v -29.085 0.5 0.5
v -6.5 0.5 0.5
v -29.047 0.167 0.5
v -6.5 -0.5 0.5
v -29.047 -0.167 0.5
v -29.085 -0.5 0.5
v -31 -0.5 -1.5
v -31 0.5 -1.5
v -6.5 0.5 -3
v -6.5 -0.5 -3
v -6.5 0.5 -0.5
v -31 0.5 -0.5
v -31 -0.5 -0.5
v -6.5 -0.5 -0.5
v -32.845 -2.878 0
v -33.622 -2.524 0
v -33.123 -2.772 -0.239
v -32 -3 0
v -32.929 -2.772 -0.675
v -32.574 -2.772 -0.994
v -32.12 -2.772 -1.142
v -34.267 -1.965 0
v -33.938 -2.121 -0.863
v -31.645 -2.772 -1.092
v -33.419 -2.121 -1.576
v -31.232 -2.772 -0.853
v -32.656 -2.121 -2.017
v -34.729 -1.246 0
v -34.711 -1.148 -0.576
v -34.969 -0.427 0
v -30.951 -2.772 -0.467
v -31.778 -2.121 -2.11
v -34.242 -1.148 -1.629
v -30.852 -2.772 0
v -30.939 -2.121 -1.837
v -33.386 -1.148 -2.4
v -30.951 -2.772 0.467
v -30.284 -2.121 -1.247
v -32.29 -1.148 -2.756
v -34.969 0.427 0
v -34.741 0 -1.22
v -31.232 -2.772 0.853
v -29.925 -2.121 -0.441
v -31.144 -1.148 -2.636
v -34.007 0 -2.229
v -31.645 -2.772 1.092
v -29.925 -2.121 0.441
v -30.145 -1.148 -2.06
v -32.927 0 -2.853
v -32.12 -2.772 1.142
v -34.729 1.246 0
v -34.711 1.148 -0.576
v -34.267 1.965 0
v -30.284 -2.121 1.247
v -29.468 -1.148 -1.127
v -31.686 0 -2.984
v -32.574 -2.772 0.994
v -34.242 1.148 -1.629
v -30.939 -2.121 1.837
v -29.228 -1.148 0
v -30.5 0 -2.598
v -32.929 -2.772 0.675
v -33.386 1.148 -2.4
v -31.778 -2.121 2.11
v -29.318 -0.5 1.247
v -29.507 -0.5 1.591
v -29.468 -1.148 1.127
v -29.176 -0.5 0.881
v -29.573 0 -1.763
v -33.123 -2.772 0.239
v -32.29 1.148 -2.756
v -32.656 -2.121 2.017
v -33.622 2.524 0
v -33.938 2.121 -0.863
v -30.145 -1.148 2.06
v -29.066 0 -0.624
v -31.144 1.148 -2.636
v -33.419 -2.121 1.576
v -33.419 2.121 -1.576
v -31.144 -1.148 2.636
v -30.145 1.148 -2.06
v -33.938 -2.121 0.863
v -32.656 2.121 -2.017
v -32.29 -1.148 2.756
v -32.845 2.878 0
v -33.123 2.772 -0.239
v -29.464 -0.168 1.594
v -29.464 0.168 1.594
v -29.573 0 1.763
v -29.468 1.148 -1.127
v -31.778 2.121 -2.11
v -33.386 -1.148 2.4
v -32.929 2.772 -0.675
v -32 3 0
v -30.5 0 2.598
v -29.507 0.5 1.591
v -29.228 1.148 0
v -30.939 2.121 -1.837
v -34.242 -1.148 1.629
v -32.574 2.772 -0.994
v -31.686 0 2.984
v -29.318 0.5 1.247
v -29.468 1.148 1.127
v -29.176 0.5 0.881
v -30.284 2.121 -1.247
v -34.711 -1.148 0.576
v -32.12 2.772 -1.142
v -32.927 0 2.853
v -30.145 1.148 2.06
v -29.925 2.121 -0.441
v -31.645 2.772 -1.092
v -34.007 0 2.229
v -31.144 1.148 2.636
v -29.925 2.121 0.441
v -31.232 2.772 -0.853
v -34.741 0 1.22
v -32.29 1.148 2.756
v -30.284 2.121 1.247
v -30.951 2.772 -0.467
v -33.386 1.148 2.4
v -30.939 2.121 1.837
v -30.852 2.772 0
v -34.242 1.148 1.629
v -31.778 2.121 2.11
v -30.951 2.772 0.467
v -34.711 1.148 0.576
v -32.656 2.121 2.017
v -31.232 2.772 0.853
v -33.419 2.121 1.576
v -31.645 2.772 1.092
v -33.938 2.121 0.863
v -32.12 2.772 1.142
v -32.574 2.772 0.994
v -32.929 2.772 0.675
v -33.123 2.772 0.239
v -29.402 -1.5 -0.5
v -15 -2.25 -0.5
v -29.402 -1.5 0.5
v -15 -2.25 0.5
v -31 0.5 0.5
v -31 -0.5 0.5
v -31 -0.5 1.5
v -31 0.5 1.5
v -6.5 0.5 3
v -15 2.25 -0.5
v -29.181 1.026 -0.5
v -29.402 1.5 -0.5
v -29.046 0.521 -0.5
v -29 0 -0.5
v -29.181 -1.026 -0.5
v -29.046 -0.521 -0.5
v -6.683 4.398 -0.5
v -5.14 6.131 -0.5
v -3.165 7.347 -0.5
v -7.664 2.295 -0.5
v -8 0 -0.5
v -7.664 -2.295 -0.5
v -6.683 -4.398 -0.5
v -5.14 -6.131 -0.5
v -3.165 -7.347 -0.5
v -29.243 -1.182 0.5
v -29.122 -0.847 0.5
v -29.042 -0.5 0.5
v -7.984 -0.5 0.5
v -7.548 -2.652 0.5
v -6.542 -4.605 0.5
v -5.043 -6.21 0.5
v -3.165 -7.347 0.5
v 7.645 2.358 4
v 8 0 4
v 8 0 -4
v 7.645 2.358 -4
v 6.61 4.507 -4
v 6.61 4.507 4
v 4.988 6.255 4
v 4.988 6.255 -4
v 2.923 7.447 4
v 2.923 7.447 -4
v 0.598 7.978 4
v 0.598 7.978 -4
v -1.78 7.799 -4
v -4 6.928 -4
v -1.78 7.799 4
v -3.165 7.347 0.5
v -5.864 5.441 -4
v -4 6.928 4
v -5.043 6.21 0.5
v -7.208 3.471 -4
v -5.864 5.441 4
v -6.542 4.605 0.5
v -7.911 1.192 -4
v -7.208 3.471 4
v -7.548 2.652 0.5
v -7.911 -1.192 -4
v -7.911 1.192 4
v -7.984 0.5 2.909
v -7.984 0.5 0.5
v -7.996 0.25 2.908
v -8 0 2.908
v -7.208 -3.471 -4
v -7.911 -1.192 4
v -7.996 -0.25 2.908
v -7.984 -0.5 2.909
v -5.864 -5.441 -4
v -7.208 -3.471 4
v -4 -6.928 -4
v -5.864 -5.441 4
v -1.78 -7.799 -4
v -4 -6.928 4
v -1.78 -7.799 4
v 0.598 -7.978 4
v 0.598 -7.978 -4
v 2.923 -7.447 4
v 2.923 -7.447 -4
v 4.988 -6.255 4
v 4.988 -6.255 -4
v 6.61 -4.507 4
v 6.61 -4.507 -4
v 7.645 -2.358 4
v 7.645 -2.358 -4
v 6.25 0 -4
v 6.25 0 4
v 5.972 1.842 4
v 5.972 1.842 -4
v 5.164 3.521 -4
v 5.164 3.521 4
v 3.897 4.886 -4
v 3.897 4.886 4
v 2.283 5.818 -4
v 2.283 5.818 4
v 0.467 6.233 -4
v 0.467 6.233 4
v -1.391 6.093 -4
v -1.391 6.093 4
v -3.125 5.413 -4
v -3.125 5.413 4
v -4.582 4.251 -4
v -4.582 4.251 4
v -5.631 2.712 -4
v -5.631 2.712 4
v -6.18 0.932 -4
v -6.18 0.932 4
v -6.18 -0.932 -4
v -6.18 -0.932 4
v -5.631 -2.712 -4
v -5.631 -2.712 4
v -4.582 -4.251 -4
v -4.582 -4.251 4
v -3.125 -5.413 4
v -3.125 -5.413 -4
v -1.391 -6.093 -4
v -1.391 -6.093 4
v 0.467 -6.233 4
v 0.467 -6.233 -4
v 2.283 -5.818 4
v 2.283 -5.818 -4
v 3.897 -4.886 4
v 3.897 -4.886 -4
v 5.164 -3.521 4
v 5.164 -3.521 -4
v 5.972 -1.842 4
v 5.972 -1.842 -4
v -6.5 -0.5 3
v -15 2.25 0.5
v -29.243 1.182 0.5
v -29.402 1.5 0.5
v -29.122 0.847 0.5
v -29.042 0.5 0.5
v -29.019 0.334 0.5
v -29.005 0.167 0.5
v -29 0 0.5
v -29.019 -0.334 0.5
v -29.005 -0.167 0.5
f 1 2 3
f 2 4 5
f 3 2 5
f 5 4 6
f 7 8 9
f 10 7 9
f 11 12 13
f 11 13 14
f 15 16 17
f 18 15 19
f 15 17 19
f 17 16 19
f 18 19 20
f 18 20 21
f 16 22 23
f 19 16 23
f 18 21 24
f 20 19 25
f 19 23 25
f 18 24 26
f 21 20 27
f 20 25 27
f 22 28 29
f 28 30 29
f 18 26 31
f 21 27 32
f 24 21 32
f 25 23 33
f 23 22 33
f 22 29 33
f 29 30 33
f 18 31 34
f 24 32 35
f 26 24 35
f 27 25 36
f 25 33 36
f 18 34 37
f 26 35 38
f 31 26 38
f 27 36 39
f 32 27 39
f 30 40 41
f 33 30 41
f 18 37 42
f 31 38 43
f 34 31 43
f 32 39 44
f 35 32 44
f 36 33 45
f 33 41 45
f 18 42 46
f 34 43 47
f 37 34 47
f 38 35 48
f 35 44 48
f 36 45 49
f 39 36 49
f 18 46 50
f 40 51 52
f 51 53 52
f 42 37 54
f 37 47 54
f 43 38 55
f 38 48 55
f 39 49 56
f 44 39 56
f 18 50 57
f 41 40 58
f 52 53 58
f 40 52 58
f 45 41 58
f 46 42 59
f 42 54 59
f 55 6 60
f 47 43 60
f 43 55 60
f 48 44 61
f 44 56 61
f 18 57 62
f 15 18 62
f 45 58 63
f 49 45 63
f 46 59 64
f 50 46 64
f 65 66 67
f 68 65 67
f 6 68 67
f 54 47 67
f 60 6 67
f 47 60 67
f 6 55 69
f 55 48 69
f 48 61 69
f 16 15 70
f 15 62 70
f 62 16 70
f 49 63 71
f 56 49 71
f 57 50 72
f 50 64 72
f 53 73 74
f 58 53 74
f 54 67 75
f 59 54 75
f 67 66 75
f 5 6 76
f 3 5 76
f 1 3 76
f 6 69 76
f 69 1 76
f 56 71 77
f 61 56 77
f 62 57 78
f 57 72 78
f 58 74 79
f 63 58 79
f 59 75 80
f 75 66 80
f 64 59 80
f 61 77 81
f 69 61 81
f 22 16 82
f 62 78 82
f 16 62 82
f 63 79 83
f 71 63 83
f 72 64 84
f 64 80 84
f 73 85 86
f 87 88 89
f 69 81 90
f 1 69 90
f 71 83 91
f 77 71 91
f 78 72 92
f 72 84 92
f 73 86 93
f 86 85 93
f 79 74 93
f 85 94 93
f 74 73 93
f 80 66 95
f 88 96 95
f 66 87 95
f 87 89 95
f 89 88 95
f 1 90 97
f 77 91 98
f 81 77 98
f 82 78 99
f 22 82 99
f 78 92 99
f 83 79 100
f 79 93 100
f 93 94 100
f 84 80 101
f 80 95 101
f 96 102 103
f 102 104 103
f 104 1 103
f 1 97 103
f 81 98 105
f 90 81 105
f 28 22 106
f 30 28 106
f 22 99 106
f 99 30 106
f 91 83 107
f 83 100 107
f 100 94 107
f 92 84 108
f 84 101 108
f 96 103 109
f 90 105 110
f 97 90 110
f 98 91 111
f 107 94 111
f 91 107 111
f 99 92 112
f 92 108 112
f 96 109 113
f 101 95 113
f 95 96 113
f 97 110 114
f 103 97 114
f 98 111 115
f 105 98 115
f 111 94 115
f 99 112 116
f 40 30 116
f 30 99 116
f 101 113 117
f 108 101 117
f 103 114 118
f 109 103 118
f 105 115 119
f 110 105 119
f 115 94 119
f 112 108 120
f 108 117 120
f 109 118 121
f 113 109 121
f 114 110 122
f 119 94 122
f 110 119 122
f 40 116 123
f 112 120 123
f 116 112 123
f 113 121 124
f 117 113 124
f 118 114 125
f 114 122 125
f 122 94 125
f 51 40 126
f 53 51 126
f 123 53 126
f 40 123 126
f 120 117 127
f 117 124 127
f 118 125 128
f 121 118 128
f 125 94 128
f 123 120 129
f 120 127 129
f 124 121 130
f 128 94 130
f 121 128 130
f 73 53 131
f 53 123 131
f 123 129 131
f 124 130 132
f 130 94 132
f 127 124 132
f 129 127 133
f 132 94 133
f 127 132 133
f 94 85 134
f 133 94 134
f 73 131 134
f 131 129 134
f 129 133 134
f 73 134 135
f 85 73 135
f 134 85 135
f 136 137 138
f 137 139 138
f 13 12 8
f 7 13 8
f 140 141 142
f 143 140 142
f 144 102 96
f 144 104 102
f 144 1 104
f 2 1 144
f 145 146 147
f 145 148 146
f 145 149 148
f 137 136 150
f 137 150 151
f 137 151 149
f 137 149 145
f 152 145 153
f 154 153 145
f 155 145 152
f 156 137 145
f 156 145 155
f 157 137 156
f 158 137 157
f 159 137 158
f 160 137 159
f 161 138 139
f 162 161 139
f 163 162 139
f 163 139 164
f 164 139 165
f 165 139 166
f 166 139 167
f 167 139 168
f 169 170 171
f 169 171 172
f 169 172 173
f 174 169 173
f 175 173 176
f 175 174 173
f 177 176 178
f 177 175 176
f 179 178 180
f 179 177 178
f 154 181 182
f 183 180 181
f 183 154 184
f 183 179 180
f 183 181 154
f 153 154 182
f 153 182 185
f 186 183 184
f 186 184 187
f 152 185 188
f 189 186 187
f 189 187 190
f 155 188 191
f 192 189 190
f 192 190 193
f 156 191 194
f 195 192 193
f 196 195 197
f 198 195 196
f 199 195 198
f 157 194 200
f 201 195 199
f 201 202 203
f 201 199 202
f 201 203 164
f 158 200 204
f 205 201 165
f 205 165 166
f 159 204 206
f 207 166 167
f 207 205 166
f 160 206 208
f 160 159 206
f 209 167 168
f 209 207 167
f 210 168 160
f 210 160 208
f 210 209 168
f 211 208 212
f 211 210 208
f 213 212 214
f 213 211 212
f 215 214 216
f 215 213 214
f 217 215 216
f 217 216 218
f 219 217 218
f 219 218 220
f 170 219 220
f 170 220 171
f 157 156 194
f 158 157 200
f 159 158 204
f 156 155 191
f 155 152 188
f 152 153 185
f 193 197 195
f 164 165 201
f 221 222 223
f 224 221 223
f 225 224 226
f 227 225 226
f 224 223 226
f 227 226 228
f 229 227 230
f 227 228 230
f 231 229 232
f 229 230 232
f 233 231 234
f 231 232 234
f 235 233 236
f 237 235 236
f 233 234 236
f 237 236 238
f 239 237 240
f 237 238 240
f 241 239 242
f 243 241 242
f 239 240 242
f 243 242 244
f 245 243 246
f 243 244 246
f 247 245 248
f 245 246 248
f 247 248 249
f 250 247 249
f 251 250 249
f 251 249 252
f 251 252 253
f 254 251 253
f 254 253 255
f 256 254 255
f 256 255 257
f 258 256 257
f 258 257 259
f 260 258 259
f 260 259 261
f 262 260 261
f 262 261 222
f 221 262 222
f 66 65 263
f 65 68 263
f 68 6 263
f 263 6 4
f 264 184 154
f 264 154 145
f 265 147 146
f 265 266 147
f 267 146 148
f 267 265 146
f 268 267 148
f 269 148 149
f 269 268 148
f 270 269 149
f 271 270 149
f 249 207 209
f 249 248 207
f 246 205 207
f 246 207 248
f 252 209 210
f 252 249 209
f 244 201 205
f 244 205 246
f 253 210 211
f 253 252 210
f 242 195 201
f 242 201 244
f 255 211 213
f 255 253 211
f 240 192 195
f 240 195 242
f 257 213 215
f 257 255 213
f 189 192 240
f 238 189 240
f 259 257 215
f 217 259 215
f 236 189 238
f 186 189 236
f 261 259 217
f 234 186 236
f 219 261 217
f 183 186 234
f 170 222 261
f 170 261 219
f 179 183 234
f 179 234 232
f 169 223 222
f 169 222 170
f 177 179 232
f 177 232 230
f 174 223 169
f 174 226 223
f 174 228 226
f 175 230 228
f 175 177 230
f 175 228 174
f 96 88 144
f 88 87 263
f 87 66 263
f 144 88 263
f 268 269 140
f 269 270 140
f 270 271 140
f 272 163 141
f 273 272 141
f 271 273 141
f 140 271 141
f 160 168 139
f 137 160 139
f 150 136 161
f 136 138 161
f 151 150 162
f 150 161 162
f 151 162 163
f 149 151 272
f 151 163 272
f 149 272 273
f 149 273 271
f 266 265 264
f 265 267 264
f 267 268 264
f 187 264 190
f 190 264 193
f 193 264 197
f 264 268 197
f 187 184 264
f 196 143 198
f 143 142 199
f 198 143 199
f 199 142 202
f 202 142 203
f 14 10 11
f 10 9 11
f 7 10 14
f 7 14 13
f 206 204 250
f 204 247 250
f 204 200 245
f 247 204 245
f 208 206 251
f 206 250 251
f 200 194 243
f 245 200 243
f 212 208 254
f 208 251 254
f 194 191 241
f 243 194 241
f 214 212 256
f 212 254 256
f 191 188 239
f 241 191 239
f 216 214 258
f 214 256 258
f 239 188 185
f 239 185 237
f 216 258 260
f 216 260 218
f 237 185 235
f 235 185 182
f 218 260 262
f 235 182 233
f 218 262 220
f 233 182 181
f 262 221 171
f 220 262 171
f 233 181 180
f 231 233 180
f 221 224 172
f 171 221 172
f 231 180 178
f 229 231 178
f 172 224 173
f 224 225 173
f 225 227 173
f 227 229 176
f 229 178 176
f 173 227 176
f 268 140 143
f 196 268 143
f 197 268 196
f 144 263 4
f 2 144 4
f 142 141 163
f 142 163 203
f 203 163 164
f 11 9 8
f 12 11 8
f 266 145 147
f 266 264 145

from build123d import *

# Parameters (mm, degrees)
ESQUISSE1_R             = 8
EXTRUSION1_DEPTH        = 4
ESQUISSE2_R             = 6.25
ENL_V_MAT_EXTRU_1_DEPTH = 14.856406461
EXTRUSION2_DEPTH        = 0.5
EXTRUSION5_DEPTH        = 0.5
SYM_TRIE4_START         = -0.5
SYM_TRIE4_DEPTH         = 1
SYM_TRIE4_2_DEPTH       = 1


with BuildPart() as part:
    # Esquisse1 → Extrusion1 (new, symmetric)
    with BuildSketch(Plane.XY):
        Circle(ESQUISSE1_R)
    extrude(amount=EXTRUSION1_DEPTH, both=True)

    # Esquisse2 → Enlèv. mat.-Extru.1 (cut, through all)
    with BuildSketch(Plane.XY.offset(4)):
        Circle(ESQUISSE2_R)
    extrude(amount=-ENL_V_MAT_EXTRU_1_DEPTH, mode=Mode.SUBTRACT)

    # Esquisse4 → Extrusion2 (add, symmetric)
    with BuildSketch(Plane.XY):
        with BuildLine():
            Line((-29, 0), (-8, 0))
            ThreePointArc((-8, 0), (-6.682676871, 4.397934723), (-3.164542542, 7.347494165))
            Line((-3.164542542, 7.347494165), (-15, 2.25))
            Line((-15, 2.25), (-29.401923789, 1.5))
            ThreePointArc((-29.401923789, 1.5), (-29.102222521, 0.776457135), (-29, 0))
        make_face()
    extrusion2 = extrude(amount=EXTRUSION2_DEPTH, both=True)

    # Symétrie1: Extrusion2 across plane
    add(extrusion2.mirror(Plane.ZX))

    # Sym_trie4 2 outline → Sym_trie4 2 (add)
    with BuildSketch(Plane(origin=(0, 0, 0), x_dir=(1, 0, 0), z_dir=(0, 1, 0)).offset(SYM_TRIE4_START)):
        Polygon((-31, -0.5), (-31, -1.5), (-7.984359711, -2.909120834), (-7.984359711, -0.5), align=None)
    extrude(amount=SYM_TRIE4_2_DEPTH)


with BuildPart() as body_2:
    # Esquisse3 → Révolution1 (revolve)
    with BuildSketch(Plane.XY):
        with BuildLine():
            Line((-32, 3), (-32, -3))
            ThreePointArc((-32, -3), (-35, 0), (-32, 3))
        make_face()
    revolve(axis=Axis((-32, 3, 0), (0, -1, 0)))

    # Symétrie4: read off the stored shape, not the designer's step
    # Symétrie4 outline → Symétrie4 (add)
    with BuildSketch(Plane(origin=(0, 0, 0), x_dir=(1, 0, 0), z_dir=(0, 1, 0)).offset(SYM_TRIE4_START)):
        Polygon((-6.5, -3), (-6.5, -0.5), (-30, -0.5), (-30, -1.56122449), (-29.506542384, -1.591436181), align=None)
    extrude(amount=SYM_TRIE4_DEPTH)


with BuildPart() as body_3:
    # Esquisse7 → Extrusion5 (new, symmetric)
    with BuildSketch(Plane(origin=(0, 0, 0), x_dir=(1, 0, 0), z_dir=(0, 1, 0))):
        Polygon((-31, 1.5), (-6.5, 3), (-6.5, 0.5), (-15, 0.5), (-31, 0.5), align=None)
    extrude(amount=EXTRUSION5_DEPTH, both=True)


solid = Compound([part.part, body_2.part, body_3.part])
